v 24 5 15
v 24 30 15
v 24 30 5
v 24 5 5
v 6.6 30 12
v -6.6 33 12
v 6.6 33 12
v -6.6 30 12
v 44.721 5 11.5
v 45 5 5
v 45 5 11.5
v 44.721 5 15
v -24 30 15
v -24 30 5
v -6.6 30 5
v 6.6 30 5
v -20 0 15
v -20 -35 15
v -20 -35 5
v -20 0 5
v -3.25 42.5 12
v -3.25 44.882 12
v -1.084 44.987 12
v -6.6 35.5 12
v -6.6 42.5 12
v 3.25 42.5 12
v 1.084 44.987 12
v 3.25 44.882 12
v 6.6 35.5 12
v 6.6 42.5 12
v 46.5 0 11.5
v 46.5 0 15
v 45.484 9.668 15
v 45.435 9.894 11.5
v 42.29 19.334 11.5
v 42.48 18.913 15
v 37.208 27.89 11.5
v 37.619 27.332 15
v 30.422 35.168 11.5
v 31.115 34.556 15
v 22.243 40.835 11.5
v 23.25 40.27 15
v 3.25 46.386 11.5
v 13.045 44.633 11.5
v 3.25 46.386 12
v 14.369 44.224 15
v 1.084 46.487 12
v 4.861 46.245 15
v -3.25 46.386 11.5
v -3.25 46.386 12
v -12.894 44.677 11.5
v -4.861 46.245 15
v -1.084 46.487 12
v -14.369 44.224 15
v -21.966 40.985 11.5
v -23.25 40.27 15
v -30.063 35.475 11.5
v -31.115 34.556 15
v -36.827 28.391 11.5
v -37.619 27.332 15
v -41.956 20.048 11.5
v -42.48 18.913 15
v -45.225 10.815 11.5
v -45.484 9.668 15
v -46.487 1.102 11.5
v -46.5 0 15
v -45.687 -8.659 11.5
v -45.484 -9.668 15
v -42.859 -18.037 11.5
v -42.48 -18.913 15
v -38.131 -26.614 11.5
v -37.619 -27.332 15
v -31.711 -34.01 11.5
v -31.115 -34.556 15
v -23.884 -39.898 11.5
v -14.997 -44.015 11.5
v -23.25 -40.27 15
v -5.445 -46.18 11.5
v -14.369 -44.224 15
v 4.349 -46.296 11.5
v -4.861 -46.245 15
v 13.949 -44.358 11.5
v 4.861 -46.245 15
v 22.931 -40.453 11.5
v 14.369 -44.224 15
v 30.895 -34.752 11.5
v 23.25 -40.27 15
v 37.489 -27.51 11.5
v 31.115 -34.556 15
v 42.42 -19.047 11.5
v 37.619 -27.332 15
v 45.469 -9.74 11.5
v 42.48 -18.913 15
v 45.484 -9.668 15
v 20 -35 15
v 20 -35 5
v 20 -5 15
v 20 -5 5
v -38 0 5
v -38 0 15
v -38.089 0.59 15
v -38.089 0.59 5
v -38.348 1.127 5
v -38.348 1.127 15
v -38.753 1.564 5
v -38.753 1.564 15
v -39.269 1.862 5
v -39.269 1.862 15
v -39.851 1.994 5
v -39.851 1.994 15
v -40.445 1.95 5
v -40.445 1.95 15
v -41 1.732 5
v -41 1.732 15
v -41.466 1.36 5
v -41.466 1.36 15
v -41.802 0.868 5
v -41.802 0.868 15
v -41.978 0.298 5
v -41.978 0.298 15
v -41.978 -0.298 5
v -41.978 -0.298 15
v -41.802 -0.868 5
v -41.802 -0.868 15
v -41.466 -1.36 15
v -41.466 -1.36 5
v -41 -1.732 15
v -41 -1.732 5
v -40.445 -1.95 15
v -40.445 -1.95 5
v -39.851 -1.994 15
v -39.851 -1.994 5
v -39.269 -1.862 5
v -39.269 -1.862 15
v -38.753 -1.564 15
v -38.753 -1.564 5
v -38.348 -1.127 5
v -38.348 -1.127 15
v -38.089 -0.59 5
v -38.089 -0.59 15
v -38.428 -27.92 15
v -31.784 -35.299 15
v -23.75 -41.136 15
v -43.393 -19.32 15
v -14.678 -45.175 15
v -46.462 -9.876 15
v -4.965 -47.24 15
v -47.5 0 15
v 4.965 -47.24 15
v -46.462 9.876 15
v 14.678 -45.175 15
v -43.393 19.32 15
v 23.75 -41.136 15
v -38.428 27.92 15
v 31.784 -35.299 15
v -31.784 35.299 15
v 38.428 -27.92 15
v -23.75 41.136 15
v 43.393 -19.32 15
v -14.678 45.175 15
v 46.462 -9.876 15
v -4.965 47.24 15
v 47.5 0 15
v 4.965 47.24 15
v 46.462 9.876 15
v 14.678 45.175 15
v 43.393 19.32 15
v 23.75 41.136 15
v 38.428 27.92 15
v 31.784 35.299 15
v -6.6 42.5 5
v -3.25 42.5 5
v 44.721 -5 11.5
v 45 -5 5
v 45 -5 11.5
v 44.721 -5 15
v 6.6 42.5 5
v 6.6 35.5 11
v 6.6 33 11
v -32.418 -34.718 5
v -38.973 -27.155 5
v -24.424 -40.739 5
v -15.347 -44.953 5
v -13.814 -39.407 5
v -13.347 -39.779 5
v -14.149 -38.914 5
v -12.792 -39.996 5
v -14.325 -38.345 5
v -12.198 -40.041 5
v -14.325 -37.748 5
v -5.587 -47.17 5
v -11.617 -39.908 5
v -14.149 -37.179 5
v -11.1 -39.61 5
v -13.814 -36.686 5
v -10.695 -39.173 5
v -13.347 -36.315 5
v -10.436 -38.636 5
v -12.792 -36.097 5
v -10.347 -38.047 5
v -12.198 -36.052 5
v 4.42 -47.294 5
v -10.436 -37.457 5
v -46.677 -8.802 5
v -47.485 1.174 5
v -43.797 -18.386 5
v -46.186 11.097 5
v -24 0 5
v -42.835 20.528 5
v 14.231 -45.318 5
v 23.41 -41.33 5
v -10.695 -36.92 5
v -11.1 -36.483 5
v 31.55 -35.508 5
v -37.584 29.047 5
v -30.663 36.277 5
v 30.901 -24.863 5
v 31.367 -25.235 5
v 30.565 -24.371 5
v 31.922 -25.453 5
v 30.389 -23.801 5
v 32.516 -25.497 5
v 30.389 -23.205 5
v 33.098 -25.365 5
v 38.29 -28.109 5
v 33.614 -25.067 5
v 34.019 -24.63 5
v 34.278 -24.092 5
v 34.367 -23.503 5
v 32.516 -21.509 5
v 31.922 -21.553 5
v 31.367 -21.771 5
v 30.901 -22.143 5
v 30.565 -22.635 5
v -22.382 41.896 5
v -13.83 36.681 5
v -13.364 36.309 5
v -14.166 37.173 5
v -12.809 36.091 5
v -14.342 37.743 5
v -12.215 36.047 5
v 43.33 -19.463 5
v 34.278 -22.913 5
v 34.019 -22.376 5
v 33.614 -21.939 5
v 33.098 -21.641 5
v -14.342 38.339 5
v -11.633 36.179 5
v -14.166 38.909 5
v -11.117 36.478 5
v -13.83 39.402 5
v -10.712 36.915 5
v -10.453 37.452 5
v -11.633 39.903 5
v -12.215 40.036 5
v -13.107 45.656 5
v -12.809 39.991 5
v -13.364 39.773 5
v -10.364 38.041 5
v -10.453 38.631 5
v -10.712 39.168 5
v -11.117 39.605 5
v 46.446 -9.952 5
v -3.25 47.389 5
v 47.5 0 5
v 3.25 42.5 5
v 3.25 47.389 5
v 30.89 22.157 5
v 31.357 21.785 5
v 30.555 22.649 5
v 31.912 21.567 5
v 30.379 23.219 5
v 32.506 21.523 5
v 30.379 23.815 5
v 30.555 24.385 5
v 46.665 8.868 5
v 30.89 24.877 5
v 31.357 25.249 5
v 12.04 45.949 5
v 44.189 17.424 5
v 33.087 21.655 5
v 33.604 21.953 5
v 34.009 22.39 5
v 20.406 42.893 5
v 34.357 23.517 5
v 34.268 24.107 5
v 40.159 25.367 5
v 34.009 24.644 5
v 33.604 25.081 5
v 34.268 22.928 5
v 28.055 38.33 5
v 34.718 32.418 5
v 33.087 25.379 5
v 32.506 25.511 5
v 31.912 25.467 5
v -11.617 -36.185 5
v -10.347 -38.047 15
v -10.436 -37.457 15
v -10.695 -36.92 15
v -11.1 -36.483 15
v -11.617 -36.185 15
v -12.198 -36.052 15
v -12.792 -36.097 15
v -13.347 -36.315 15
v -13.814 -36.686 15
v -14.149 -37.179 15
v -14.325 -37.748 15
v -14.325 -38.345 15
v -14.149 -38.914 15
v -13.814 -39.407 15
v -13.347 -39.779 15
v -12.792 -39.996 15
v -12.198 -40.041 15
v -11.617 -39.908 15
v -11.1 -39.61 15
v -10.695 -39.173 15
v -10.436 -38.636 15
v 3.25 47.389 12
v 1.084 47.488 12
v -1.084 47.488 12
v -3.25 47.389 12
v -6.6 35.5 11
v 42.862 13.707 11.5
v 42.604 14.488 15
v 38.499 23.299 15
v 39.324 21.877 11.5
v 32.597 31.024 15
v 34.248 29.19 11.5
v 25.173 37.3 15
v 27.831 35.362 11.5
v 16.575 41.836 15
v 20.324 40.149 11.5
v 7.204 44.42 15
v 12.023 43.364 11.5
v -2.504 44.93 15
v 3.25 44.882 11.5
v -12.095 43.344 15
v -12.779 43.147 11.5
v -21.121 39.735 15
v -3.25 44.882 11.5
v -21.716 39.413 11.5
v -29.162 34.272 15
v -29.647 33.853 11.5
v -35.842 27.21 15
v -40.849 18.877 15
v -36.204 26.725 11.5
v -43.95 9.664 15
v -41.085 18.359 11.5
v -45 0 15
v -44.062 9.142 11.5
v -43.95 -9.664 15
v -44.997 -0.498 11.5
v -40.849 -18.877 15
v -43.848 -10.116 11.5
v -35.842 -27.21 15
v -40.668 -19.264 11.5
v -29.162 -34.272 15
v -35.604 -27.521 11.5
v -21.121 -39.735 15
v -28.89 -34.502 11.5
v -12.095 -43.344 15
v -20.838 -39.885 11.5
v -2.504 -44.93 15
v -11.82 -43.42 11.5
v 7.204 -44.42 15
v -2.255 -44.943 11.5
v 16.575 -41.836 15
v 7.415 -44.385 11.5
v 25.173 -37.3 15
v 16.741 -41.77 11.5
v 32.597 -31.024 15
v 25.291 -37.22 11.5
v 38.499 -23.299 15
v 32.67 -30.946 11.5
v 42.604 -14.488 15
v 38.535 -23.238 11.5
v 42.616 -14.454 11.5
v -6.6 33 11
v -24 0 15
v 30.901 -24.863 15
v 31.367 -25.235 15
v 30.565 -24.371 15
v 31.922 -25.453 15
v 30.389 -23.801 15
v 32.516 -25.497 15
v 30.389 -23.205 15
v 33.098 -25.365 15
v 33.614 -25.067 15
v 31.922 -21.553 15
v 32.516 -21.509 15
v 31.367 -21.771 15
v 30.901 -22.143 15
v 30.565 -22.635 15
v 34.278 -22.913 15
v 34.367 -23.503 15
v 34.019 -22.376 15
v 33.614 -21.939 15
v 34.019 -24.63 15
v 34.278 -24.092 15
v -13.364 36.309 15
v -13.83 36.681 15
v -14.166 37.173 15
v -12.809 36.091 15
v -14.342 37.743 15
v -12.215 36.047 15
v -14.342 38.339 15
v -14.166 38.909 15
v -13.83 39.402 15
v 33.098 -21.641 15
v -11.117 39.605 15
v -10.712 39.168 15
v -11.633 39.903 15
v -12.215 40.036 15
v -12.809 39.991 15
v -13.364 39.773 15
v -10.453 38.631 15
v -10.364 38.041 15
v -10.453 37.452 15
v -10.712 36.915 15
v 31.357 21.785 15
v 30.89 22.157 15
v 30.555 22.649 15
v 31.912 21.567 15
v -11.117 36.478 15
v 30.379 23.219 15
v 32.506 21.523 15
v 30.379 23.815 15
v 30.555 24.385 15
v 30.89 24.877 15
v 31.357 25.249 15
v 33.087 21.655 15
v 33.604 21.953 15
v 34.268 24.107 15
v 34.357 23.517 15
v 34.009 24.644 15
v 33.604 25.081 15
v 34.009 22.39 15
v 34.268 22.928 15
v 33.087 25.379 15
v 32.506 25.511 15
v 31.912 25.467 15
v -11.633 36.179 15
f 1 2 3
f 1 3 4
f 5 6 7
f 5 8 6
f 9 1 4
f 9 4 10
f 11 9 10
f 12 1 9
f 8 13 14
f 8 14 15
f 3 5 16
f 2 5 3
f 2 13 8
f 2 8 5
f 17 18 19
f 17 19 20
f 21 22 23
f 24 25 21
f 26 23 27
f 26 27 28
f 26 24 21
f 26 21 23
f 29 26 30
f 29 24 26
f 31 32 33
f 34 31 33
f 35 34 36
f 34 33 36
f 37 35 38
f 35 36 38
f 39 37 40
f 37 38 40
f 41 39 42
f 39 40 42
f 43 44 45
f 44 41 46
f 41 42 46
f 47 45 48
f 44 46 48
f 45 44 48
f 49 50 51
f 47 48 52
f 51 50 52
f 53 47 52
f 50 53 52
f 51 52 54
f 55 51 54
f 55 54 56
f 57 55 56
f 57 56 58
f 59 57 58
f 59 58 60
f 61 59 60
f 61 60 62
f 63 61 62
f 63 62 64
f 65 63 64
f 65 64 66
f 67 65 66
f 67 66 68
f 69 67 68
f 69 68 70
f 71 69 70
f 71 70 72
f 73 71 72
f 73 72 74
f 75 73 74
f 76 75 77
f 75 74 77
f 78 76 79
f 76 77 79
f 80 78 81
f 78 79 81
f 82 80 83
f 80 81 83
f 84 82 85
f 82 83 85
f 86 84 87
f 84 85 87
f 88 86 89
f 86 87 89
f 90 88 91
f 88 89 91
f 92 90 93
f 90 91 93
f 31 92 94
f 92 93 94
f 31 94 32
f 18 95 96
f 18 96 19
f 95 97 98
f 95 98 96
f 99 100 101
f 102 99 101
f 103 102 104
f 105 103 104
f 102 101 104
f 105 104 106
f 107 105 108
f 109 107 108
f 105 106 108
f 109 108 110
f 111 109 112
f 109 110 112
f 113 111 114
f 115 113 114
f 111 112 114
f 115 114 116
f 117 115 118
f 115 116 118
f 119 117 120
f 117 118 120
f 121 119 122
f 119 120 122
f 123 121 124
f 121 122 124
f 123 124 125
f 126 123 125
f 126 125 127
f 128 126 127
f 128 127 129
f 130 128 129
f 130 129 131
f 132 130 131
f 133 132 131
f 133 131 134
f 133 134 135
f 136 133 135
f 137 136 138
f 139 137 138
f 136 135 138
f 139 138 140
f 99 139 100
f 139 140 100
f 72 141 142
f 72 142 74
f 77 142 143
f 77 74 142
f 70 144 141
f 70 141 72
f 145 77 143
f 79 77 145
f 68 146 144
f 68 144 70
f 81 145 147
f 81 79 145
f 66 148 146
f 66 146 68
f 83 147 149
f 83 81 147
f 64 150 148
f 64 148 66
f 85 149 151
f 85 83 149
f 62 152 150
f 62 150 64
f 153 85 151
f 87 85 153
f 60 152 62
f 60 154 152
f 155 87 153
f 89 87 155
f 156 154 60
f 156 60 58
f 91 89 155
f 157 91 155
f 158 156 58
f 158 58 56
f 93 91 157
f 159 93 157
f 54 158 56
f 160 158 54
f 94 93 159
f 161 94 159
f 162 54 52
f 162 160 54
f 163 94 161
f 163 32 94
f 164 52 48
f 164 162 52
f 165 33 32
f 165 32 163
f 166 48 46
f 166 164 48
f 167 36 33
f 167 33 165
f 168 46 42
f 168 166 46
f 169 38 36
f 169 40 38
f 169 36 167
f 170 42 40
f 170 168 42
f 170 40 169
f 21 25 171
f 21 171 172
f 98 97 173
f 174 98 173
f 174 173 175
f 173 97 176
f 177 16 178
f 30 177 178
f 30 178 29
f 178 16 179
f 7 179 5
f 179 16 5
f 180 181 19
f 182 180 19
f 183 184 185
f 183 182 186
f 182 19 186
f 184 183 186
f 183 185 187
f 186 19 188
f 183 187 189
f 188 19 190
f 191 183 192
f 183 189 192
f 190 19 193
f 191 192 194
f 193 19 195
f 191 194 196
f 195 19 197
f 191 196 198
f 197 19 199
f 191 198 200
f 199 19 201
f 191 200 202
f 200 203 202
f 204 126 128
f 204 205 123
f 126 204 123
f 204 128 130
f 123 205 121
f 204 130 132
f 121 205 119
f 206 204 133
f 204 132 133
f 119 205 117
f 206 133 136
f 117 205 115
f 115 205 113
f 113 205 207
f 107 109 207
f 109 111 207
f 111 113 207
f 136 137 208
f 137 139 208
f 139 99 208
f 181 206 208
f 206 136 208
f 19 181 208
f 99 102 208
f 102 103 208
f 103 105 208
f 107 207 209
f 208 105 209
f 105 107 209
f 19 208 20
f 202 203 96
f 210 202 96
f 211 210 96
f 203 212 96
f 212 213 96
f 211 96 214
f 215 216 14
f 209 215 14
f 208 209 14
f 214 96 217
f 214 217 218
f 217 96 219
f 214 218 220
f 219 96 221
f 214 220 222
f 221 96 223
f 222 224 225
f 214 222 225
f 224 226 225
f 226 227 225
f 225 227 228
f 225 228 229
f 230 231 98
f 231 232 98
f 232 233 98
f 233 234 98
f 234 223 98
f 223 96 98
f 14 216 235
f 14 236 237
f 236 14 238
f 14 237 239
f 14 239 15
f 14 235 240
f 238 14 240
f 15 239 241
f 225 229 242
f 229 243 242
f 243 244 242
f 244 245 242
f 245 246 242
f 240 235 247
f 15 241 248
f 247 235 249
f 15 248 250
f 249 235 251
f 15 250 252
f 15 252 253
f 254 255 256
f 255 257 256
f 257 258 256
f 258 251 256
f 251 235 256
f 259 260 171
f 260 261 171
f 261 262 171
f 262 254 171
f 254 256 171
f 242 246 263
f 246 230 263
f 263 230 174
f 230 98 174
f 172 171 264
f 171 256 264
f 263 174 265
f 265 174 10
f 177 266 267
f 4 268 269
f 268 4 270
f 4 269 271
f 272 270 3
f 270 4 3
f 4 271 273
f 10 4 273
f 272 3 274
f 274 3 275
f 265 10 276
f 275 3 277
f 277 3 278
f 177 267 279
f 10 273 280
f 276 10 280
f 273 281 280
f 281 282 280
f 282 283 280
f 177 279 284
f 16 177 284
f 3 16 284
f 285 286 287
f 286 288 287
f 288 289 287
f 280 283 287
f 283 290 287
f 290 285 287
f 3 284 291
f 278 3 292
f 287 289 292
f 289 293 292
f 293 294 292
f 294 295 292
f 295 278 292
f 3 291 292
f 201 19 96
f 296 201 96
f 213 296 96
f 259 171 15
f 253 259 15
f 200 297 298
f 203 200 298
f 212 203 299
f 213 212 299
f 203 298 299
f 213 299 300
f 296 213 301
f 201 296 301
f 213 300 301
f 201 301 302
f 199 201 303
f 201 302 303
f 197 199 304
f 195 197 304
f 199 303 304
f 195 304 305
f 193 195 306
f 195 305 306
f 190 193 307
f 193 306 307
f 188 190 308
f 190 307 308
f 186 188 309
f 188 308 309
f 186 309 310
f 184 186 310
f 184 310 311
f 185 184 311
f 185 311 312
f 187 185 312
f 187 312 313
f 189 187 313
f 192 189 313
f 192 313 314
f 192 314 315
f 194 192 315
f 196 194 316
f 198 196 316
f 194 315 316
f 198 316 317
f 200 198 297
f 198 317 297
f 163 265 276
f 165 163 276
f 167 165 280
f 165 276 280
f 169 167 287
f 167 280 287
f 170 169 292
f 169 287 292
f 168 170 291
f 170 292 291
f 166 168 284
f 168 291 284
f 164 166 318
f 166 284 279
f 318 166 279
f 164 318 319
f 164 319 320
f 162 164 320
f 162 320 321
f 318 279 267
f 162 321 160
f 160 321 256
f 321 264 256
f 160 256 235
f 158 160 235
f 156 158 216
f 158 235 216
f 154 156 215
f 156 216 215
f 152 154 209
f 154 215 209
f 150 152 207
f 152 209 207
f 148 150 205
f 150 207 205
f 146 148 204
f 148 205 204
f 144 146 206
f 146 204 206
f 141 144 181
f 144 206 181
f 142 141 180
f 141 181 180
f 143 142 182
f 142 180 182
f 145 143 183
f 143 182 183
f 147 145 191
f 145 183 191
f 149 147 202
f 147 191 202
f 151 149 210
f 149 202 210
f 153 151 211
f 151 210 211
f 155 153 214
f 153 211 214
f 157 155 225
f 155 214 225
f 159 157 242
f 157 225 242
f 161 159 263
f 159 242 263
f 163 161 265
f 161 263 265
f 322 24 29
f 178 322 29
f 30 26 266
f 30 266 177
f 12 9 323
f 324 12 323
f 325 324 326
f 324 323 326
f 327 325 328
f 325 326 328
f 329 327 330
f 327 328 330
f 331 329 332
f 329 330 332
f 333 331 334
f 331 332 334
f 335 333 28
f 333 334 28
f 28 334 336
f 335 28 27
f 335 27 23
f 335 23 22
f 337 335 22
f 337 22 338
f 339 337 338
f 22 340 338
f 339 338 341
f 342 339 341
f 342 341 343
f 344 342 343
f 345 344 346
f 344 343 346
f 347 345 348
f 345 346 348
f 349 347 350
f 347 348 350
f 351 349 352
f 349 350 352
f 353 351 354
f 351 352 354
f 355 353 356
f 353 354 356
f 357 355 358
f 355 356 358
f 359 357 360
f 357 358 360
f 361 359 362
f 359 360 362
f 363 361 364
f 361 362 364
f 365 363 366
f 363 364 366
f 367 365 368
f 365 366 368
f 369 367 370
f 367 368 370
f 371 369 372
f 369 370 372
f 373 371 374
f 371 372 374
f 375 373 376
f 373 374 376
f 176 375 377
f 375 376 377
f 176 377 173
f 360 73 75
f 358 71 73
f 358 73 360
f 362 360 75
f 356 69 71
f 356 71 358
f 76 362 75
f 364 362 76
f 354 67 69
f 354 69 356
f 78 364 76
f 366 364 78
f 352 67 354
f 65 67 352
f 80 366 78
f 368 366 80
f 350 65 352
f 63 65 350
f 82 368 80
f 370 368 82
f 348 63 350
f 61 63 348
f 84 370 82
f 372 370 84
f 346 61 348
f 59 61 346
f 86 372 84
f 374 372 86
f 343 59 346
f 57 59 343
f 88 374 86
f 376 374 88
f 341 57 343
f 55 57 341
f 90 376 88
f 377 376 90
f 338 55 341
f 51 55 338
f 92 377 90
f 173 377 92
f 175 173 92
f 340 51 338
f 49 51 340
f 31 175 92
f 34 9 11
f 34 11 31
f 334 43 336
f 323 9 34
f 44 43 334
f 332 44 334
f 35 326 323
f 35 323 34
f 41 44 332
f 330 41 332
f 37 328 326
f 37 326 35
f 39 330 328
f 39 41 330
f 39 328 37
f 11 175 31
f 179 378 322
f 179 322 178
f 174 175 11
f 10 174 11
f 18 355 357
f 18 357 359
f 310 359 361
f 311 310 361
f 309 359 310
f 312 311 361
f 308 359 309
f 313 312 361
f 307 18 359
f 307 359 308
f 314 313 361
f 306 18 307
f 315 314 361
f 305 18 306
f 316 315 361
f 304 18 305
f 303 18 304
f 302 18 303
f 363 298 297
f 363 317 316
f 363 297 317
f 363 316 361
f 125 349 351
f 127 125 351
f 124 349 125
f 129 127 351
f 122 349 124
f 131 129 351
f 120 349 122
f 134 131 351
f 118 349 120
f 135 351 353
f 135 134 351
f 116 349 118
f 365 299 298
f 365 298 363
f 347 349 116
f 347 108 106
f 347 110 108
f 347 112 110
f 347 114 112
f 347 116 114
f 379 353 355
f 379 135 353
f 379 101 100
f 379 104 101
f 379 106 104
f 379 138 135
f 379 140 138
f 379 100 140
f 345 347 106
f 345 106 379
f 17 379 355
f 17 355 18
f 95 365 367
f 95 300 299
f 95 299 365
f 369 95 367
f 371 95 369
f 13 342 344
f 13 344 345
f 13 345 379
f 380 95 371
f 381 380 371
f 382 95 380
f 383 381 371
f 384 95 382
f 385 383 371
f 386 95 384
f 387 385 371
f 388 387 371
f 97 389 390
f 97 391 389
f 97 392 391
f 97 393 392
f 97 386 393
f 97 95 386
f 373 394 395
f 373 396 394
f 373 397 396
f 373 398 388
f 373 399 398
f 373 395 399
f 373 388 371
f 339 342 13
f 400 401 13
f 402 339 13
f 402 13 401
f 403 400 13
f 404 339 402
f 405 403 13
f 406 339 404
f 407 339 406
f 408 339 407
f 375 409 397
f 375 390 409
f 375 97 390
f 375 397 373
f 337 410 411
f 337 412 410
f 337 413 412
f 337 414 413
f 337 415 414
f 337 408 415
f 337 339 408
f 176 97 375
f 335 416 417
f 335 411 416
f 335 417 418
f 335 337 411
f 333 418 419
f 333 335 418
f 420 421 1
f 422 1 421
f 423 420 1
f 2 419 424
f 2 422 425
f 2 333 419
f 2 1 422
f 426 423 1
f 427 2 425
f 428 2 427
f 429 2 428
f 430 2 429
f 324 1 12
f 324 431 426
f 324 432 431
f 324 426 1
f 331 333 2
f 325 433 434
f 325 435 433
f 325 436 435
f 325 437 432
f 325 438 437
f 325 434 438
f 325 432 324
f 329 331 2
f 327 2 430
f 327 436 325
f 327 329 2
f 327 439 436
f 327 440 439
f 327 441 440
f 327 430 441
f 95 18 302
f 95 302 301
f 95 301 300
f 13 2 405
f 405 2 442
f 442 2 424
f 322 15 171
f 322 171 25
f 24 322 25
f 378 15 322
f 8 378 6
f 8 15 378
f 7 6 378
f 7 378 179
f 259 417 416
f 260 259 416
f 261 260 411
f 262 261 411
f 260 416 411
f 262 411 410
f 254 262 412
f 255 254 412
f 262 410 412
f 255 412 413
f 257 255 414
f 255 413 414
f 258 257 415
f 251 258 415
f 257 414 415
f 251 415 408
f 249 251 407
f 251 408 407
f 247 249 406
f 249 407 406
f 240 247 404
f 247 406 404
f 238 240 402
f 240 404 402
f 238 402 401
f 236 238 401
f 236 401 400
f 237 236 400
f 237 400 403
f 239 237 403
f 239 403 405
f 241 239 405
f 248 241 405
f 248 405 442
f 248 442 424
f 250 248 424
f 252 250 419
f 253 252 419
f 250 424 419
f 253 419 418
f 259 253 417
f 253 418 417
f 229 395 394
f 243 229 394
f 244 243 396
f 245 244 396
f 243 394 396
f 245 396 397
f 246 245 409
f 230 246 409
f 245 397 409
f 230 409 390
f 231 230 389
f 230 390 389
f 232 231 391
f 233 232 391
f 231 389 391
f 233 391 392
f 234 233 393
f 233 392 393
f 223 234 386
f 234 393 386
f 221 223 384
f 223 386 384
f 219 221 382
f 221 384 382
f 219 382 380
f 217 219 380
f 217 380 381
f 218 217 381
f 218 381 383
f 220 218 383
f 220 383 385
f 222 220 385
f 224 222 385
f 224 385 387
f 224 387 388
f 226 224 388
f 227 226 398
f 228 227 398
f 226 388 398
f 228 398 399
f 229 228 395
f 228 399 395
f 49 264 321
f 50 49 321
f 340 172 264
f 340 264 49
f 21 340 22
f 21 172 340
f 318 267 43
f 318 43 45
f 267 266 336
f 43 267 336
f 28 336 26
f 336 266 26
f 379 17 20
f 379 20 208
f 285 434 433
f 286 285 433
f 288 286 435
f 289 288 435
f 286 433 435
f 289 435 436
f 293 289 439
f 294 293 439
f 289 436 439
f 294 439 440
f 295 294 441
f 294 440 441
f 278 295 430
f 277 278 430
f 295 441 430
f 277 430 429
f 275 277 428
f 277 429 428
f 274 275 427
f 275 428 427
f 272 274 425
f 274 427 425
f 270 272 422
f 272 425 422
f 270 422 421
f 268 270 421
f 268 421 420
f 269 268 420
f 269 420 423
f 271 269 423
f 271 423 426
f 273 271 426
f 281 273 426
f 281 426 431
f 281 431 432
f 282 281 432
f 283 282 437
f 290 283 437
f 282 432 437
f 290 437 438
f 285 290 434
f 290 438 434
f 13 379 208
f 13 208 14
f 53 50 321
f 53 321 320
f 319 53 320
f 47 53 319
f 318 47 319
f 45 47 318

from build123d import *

# Parameters (mm, degrees)
SKETCH005_R     = 47.5
PAD002_DEPTH    = 10
SKETCH006_R     = 46.5
POCKET001_DEPTH = 3.5
SKETCH007_R     = 45
PAD003_DEPTH    = 3.5
POCKET003_DEPTH = 10
SKETCH011_W     = 25
SKETCH011_H     = 10
POCKET004_DEPTH = 10
SKETCH014_R     = 2
POCKET007_DEPTH = 10
SKETCH018_W     = 13.2
SKETCH018_H     = 7
POCKET011_DEPTH = 12.5
SKETCH019_W     = 6.5
SKETCH019_H     = 7
POCKET012_DEPTH = 5
SKETCH020_W     = 13.2
SKETCH020_H     = 2.5
PAD005_DEPTH    = 1


with BuildPart() as part:
    # Sketch005 → Pad002 (new body)
    with BuildSketch(Plane.XY):
        Circle(SKETCH005_R)
    extrude(amount=PAD002_DEPTH)

    # Sketch006 (on Face3 of Pad002) → Pocket001 (cut)
    with BuildSketch(Plane.XY.offset(10)):
        Circle(SKETCH006_R)
    extrude(amount=-POCKET001_DEPTH, mode=Mode.SUBTRACT)

    # Sketch007 (on Face5 of Pocket001) → Pad003 (join)
    with BuildSketch(Plane.XY.offset(6.5)):
        Circle(SKETCH007_R)
    extrude(amount=PAD003_DEPTH)

    # Sketch010 (on Face7 of Pad003) → Pocket003 (cut)
    with BuildSketch(Plane.XY.offset(10)):
        Polygon((20, 0), (20, -35), (-20, -35), (-20, 0), (-24, 0), (-24, 30), (24, 30), (24, 0), align=None)
    extrude(amount=-POCKET003_DEPTH, mode=Mode.SUBTRACT)

    # Sketch011 (on Face13 of Pocket003) → Pocket004 (cut)
    with BuildSketch(Plane.XY.offset(10)):
        with Locations((32.5, 0)):
            Rectangle(SKETCH011_W, SKETCH011_H)
    extrude(amount=-POCKET004_DEPTH, mode=Mode.SUBTRACT)

    # Sketch014 (on Face15 of Pocket004) → Pocket007 (cut)
    with BuildSketch(Plane.XY.offset(10)):
        with Locations((-40, 0)):
            Circle(SKETCH014_R)
        with Locations((-12.363995, 38.041183)):
            Circle(SKETCH014_R)
        with Locations((32.356581, 23.51705)):
            Circle(SKETCH014_R)
        with Locations((32.366826, -23.502949)):
            Circle(SKETCH014_R)
        with Locations((-12.347418, -38.046567)):
            Circle(SKETCH014_R)
    extrude(amount=-POCKET007_DEPTH, mode=Mode.SUBTRACT)

    # Sketch018 (on Face9 of Pocket007) → Pocket011 (cut)
    with BuildSketch(Plane.XZ.offset(-30)):
        with Locations((0, 3.5)):
            Rectangle(SKETCH018_W, SKETCH018_H)
    extrude(amount=-POCKET011_DEPTH, mode=Mode.SUBTRACT)

    # Sketch019 (on Face18 of Pocket011) → Pocket012 (cut)
    with BuildSketch(Plane.XZ.offset(-42.5)):
        with Locations((0, 3.5)):
            Rectangle(SKETCH019_W, SKETCH019_H)
    extrude(amount=-POCKET012_DEPTH, mode=Mode.SUBTRACT)

    # Sketch020 (on Face29 of Pocket012) → Pad005 (join)
    with BuildSketch(Plane(origin=(0, 0, 7), x_dir=(1, 0, 0), z_dir=(0, 0, -1))):
        with Locations((0, -34.25)):
            Rectangle(SKETCH020_W, SKETCH020_H)
    extrude(amount=PAD005_DEPTH)


with BuildPart() as part_1:
    # Body002 placement: moved
    add(part.part.moved(Location((0, 0, 5))))


solid = part_1.part
